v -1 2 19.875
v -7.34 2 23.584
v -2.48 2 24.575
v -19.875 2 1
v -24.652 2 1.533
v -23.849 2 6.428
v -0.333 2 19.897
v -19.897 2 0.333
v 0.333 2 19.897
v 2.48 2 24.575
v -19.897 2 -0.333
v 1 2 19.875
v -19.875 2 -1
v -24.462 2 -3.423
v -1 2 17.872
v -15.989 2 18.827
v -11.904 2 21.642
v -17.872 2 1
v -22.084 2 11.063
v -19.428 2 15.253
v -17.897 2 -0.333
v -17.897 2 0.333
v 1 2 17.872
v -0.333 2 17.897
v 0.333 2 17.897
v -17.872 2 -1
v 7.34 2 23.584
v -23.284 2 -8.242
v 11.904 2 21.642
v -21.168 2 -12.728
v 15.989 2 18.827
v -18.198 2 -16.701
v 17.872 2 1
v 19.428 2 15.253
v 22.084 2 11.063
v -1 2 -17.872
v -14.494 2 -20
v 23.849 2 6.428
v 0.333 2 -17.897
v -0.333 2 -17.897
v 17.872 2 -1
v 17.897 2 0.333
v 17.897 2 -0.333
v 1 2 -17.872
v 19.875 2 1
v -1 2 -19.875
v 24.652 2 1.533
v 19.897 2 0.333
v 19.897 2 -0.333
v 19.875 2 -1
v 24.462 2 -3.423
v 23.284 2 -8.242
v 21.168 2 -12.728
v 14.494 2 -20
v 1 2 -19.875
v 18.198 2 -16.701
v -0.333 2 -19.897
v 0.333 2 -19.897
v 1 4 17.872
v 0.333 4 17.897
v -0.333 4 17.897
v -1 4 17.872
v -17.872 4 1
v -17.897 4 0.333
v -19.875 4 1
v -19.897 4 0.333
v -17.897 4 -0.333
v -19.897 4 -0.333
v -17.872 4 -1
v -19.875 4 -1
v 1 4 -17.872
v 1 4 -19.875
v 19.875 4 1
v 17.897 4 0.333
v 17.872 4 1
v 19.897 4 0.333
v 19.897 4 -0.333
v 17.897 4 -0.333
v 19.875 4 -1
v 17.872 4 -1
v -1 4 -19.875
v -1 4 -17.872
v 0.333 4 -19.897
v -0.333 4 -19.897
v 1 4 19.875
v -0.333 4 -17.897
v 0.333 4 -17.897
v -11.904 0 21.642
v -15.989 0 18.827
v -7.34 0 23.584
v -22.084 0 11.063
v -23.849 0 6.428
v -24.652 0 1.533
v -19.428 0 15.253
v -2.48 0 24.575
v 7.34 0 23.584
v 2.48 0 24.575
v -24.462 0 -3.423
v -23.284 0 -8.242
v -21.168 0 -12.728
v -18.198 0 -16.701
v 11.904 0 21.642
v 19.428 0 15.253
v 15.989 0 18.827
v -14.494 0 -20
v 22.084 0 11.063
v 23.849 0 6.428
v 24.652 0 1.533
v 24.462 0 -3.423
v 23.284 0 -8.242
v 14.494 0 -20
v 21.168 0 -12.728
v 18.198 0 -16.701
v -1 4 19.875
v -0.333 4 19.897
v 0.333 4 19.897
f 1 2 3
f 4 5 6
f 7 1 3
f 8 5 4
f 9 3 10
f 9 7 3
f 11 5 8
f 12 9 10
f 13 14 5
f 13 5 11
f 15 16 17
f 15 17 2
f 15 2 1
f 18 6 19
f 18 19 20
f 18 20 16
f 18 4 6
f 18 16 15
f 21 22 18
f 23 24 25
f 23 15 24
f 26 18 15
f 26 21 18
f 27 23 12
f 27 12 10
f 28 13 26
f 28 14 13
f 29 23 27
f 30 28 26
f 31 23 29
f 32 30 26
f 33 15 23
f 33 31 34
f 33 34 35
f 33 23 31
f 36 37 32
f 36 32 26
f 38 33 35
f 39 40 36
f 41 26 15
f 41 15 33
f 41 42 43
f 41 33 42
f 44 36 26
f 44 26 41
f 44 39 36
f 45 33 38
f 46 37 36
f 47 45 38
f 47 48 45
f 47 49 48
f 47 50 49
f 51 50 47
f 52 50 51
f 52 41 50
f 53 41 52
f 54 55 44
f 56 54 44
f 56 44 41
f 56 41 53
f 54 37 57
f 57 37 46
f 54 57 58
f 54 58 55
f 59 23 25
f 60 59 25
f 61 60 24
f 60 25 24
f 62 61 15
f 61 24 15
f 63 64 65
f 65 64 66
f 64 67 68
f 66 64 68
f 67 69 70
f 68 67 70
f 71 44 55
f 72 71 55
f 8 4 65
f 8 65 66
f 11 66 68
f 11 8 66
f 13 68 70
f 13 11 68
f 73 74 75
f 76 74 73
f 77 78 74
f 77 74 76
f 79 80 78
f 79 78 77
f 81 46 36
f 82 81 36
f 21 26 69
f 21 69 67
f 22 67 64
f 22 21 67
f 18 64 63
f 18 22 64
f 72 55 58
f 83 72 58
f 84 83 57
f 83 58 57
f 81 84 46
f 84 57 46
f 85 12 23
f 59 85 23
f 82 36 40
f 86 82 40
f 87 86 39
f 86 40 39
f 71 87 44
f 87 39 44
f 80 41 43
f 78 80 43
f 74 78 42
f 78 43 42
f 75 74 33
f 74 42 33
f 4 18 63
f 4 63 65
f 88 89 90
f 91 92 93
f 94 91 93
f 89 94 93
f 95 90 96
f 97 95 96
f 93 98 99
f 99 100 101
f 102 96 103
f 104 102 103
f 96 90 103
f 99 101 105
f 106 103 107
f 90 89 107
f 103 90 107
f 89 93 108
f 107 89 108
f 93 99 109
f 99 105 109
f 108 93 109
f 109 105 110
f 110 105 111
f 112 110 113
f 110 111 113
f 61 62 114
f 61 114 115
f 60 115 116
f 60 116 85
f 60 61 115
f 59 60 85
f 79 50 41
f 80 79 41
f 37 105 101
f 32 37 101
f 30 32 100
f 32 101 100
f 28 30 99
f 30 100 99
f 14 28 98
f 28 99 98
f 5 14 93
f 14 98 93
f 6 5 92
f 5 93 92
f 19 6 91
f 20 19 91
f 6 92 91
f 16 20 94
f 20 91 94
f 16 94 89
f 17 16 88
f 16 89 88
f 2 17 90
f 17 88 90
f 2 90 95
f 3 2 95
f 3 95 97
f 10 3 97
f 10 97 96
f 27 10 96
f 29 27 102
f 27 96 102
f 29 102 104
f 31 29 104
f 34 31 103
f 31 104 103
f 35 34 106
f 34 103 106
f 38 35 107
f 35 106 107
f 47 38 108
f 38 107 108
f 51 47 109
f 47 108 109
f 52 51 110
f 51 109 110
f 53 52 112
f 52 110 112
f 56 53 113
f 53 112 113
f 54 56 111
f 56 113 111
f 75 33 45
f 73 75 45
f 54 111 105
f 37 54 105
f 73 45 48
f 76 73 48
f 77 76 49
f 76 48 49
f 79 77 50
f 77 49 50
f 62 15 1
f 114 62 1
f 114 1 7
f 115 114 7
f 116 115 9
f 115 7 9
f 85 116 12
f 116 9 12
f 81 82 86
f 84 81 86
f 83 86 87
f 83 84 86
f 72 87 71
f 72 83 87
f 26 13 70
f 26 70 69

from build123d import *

# Parameters (mm, degrees)
BOSS_EXTRUDE1_DEPTH = 2
BOSS_EXTRUDE2_DEPTH = 2


with BuildPart() as part:
    # Sketch1 → Boss-Extrude1 (new body)
    with BuildSketch(Plane(origin=(0, 0, 0), x_dir=(1, 0, 0), z_dir=(0, 1, 0))):
        with BuildLine():
            Line((14.494481709, 20), (-14.494481709, 20))
            ThreePointArc((-14.494481709, 20), (0, -24.7), (14.494481709, 20))
        make_face()
    extrude(amount=BOSS_EXTRUDE1_DEPTH)

    # Sketch2 → Boss-Extrude2 (add)
    with BuildSketch(Plane(origin=(0, 2, 0), x_dir=(1, 0, 0), z_dir=(0, 1, 0))):
        with BuildLine():
            Line((1, 17.87204521), (1, 19.87485849))
            ThreePointArc((1, 19.87485849), (0, 19.9), (-1, 19.87485849))
            Line((-1, 19.87485849), (-1, 17.87204521))
            ThreePointArc((-1, 17.87204521), (0, 17.9), (1, 17.87204521))
        make_face()
        with BuildLine():
            Line((17.87204521, -1), (19.87485849, -1))
            ThreePointArc((19.87485849, -1), (19.9, 0), (19.87485849, 1))
            Line((19.87485849, 1), (17.87204521, 1))
            ThreePointArc((17.87204521, 1), (17.9, 0), (17.87204521, -1))
        make_face()
        with BuildLine():
            Line((-17.87204521, -1), (-19.87485849, -1))
            ThreePointArc((-19.87485849, -1), (-19.9, 0), (-19.87485849, 1))
            Line((-19.87485849, 1), (-17.87204521, 1))
            ThreePointArc((-17.87204521, 1), (-17.9, 0), (-17.87204521, -1))
        make_face()
        with BuildLine():
            Line((-1, -17.87204521), (-1, -19.87485849))
            ThreePointArc((-1, -19.87485849), (0, -19.9), (1, -19.87485849))
            Line((1, -19.87485849), (1, -17.87204521))
            ThreePointArc((1, -17.87204521), (0, -17.9), (-1, -17.87204521))
        make_face()
    extrude(amount=BOSS_EXTRUDE2_DEPTH)


solid = part.part
